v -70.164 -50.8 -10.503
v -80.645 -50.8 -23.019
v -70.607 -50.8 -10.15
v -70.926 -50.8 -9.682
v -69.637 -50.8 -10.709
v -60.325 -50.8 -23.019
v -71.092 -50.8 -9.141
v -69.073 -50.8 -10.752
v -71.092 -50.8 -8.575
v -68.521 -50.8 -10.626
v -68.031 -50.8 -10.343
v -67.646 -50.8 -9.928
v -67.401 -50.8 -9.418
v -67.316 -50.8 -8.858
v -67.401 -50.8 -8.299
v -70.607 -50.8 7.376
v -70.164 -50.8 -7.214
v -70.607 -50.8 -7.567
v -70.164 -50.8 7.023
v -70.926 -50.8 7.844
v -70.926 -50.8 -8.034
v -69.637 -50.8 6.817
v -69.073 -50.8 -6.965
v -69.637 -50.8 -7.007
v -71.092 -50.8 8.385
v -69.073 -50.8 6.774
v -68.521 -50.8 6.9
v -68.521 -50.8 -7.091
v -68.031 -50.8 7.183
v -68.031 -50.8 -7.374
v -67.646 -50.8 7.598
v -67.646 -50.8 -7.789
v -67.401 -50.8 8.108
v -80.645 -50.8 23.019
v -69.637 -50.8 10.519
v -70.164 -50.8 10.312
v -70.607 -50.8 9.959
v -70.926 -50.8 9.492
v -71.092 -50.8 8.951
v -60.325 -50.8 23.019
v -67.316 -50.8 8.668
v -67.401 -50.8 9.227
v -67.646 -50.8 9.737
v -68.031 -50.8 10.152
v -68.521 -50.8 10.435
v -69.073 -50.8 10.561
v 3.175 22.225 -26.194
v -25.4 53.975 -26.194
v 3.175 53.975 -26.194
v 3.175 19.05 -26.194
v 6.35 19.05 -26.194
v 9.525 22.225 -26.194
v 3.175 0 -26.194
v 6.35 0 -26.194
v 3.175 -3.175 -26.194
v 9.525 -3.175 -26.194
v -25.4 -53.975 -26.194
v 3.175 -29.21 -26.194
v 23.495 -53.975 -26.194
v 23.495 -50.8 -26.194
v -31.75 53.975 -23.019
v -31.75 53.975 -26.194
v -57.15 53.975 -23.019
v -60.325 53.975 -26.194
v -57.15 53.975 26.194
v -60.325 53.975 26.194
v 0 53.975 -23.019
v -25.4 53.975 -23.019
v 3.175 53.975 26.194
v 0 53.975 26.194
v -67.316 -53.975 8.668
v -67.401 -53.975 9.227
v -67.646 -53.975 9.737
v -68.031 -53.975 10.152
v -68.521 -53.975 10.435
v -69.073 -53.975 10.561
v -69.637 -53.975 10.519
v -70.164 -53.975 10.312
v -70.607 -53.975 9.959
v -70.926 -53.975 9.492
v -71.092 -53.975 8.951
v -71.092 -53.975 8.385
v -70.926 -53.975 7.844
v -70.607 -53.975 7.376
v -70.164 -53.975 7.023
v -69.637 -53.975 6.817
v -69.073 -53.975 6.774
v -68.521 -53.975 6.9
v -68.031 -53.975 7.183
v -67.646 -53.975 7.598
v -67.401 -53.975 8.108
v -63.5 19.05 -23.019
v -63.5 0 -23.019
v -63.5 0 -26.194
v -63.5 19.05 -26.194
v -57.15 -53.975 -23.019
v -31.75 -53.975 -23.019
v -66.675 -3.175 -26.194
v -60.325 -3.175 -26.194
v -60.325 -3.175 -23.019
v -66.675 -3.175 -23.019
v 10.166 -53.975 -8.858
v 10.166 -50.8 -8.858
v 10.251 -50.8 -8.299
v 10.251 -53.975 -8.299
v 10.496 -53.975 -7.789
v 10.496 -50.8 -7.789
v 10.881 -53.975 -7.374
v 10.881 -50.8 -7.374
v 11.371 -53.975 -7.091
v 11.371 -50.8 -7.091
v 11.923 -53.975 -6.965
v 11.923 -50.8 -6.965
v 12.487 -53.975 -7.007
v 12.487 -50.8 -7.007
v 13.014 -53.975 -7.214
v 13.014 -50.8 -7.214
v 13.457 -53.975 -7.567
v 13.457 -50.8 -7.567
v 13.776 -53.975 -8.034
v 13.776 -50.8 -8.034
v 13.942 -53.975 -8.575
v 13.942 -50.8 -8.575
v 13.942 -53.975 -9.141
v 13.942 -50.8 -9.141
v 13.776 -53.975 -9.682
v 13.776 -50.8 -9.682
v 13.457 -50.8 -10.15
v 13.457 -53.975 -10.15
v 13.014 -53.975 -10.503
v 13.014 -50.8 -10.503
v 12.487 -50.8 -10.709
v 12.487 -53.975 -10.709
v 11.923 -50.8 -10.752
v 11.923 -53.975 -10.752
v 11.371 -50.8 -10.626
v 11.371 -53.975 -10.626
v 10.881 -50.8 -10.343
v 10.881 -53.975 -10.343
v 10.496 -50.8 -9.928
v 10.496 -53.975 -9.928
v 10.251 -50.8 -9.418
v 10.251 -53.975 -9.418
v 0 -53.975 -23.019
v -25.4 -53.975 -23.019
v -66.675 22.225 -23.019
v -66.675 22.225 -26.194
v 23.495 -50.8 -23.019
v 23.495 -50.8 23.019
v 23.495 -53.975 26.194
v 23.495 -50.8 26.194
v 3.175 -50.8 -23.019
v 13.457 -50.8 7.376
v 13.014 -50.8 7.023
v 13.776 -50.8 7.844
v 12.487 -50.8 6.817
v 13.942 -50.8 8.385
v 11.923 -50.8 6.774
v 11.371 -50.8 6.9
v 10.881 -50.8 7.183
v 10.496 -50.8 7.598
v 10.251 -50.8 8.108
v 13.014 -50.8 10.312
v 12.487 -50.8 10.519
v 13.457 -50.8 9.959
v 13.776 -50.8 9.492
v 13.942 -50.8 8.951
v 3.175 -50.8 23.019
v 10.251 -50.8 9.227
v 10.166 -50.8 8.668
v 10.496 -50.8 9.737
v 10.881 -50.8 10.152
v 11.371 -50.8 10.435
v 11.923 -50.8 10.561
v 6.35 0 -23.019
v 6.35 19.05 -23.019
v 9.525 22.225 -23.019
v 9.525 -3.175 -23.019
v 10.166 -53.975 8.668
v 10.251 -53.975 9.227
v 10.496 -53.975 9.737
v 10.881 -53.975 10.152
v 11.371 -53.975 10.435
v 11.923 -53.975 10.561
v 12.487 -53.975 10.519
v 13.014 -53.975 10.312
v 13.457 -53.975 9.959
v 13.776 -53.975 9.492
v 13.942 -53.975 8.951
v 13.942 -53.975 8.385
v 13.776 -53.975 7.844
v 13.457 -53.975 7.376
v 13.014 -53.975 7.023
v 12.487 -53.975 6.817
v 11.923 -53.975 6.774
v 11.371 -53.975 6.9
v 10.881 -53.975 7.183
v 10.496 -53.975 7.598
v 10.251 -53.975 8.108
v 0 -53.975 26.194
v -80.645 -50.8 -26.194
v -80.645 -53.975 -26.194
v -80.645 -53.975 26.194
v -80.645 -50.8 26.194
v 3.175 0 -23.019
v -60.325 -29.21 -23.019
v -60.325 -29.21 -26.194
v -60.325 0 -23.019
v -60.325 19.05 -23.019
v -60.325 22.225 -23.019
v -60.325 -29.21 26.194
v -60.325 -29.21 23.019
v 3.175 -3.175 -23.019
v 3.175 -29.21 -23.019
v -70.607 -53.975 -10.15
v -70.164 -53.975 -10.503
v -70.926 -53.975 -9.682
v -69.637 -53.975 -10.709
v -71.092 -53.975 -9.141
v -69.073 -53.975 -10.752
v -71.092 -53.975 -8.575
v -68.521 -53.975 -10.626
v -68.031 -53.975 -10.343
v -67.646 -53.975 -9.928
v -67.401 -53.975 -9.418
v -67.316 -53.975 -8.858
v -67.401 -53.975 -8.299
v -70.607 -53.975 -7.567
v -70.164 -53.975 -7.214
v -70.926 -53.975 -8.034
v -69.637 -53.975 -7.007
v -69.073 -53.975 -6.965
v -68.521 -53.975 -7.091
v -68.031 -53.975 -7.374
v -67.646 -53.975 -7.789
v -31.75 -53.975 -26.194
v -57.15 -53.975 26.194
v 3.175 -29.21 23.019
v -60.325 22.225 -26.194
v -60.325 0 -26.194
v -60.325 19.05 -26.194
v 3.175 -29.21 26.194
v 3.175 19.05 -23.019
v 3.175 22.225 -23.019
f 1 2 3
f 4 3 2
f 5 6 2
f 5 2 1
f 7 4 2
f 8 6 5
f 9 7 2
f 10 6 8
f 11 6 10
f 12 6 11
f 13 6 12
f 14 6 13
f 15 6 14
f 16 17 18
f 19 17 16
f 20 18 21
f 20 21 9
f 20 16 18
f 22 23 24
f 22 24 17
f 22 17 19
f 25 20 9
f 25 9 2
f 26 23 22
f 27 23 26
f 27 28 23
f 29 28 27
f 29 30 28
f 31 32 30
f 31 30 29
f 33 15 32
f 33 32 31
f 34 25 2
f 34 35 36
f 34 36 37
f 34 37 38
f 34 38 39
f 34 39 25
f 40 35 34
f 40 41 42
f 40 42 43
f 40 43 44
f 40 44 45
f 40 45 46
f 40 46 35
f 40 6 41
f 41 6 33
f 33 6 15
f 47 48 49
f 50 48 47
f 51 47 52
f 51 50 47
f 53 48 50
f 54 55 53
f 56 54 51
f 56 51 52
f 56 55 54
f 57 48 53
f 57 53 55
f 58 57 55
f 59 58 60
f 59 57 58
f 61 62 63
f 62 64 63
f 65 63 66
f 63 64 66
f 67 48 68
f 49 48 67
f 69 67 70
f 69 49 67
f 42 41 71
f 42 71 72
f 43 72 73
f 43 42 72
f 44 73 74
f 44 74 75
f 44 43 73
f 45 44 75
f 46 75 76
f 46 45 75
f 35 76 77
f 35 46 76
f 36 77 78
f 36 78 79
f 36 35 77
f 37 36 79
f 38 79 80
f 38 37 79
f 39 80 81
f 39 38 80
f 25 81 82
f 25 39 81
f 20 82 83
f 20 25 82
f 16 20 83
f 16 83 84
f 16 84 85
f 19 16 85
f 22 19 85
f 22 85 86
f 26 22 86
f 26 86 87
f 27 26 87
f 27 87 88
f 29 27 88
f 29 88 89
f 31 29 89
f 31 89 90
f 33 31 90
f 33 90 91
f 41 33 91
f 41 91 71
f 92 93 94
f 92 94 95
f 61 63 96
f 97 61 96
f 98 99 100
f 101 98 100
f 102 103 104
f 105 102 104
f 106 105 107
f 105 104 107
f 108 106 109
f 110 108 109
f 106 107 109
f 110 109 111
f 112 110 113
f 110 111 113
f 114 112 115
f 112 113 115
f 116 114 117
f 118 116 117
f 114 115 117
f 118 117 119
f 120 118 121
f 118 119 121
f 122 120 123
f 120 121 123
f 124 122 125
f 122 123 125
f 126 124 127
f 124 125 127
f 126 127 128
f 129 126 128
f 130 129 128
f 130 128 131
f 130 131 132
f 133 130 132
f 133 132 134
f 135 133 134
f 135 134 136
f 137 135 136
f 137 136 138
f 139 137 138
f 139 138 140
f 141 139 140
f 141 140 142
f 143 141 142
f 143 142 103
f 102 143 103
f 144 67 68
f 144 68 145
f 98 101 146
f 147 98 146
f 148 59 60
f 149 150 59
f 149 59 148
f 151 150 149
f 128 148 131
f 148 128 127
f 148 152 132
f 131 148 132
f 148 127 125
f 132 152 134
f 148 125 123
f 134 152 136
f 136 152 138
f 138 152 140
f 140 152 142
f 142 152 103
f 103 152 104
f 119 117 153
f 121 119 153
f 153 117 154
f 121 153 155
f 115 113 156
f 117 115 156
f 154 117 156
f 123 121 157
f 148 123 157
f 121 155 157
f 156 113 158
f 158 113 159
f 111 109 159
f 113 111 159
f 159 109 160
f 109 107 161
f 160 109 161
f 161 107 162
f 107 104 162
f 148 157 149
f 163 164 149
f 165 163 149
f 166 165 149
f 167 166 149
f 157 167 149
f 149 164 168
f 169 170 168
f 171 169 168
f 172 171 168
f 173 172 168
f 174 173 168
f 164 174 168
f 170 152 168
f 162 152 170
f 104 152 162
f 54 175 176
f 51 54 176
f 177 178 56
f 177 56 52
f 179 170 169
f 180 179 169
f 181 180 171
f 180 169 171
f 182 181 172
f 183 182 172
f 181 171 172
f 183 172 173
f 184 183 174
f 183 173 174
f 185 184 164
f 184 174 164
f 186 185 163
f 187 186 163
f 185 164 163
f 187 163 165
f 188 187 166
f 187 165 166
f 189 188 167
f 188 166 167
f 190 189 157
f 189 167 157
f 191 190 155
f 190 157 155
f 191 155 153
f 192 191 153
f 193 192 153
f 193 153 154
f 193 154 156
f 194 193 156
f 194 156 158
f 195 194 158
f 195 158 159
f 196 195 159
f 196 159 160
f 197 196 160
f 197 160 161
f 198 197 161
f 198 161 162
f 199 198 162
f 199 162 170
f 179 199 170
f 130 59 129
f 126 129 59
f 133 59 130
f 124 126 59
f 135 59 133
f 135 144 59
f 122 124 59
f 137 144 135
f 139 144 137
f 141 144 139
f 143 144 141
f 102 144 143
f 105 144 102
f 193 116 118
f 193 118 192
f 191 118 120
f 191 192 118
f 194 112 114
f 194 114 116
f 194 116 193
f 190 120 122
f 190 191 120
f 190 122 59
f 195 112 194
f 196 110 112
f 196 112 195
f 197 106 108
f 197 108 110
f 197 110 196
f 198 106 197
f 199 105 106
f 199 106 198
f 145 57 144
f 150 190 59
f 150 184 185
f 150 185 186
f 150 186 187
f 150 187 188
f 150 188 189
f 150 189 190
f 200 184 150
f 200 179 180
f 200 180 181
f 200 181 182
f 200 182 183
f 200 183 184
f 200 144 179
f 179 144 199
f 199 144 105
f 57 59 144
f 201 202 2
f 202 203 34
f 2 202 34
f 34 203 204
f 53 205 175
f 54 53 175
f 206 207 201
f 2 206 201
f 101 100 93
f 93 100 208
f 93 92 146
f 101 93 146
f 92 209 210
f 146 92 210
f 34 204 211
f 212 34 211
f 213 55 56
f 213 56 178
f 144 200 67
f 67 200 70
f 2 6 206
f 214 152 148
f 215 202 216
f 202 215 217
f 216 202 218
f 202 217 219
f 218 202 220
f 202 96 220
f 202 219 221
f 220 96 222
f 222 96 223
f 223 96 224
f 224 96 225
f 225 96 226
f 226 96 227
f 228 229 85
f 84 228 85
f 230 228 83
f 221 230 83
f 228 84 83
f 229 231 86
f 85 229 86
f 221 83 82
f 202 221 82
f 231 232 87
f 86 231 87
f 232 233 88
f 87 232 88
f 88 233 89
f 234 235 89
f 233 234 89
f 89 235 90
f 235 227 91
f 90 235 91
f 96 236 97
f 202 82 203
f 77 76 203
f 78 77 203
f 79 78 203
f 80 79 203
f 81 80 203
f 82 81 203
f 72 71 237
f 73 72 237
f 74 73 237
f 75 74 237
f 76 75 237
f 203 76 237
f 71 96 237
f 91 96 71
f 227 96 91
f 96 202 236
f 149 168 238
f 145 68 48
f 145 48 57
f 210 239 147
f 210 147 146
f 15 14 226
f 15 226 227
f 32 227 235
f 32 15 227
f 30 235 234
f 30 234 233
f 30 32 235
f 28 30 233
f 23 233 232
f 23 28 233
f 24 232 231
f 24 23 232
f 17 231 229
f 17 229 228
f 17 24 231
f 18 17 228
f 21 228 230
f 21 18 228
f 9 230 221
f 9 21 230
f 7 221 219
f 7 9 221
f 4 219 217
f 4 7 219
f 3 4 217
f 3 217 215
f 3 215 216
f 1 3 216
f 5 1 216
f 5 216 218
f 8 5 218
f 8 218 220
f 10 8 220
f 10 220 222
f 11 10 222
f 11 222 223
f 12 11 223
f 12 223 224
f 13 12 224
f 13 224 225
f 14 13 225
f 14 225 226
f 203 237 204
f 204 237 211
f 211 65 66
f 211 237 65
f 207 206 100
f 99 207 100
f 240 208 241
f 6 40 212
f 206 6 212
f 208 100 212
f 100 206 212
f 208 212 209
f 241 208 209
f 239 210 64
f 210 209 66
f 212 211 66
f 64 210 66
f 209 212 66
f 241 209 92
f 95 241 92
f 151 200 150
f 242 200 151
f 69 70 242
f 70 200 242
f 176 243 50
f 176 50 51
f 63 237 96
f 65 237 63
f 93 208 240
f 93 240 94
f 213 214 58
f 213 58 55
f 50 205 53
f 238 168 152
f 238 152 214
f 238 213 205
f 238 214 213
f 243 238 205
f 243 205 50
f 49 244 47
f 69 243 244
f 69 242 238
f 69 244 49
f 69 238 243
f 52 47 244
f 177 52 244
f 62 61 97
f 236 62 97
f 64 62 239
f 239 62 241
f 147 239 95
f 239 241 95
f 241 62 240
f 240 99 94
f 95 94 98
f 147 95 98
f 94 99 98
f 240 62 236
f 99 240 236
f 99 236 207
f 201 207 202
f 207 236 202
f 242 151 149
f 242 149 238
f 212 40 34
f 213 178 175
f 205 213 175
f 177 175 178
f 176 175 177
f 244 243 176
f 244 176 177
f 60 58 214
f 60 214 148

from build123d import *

# Parameters (mm, degrees)
F0_W      = 107.95
F0_H      = 52.3875
F1_DEPTH  = 3.175
F2_W      = 107.95
F2_H      = 3.175
F3_DEPTH  = 25.4
F4_W      = 3.175
F4_H      = 52.3875
F5_DEPTH  = 20.32
F7_DEPTH  = 3.175
F9_DEPTH  = 3.175
F10_W     = 25.4
F10_H     = 3.175
F11_DEPTH = 6.35
F12_W     = 3.175
F12_H     = 19.05
F13_DEPTH = 25.4
F15_D     = 3.7973


with BuildPart() as f1:
    # F0 (on Right) → F1 (new body)
    with BuildSketch(Plane.YZ):
        Rectangle(F0_W, F0_H)
    extrude(amount=F1_DEPTH)

    # F2 (on face) → F3 (join)
    with BuildSketch(Plane(origin=(0, 0, 0), x_dir=(0, -1, 0), z_dir=(-1, 0, 0))):
        with Locations((0, -24.60625)):
            Rectangle(F2_W, F2_H)
    extrude(amount=F3_DEPTH)

    # F4 (on face) → F5 (join)
    with BuildSketch(Plane.YZ.offset(3.175)):
        with Locations((-52.3875, 0)):
            Rectangle(F4_W, F4_H)
    extrude(amount=F5_DEPTH)

    # F6 (on face) → F7 (join)
    with BuildSketch(Plane(origin=(0, 0, -26.19375), x_dir=(1, 0, 0), z_dir=(0, 0, -1))):
        Polygon((3.175, 29.21), (23.495, 50.8), (3.175, 50.8), align=None)
    extrude(amount=-F7_DEPTH)

    # F8 (on face) → F9 (join)
    with BuildSketch(Plane.XY.offset(26.19375)):
        Polygon((3.175, -50.8), (23.495, -50.8), (3.175, -29.21), align=None)
    extrude(amount=-F9_DEPTH)

    # F10 (on face) → F11 (join)
    with BuildSketch(Plane.YZ.offset(3.175)):
        with Locations((9.525, -24.60625)):
            Rectangle(F10_W, F10_H)
    extrude(amount=F11_DEPTH)

    # F12 (on face) → F13 (cut)
    with BuildSketch(Plane.XY.offset(-23.01875)):
        with Locations((4.7625, 9.525)):
            Rectangle(F12_W, F12_H)
    extrude(amount=-F13_DEPTH, mode=Mode.SUBTRACT)

    # F15 (through all)
    with Locations(Plane.XZ.offset(53.975)):
        with Locations((12.065, 8.66775), (12.065, -8.85825)):
            Hole(F15_D / 2)


with BuildPart() as f17_1:
    # F17: instance of F1
    add(f1.part.mirror(Plane(origin=(-28.575, 0, -24.60625), x_dir=(0, -1, 0), z_dir=(-1, 0, 0))))


solid = Compound([f1.part, f17_1.part])
